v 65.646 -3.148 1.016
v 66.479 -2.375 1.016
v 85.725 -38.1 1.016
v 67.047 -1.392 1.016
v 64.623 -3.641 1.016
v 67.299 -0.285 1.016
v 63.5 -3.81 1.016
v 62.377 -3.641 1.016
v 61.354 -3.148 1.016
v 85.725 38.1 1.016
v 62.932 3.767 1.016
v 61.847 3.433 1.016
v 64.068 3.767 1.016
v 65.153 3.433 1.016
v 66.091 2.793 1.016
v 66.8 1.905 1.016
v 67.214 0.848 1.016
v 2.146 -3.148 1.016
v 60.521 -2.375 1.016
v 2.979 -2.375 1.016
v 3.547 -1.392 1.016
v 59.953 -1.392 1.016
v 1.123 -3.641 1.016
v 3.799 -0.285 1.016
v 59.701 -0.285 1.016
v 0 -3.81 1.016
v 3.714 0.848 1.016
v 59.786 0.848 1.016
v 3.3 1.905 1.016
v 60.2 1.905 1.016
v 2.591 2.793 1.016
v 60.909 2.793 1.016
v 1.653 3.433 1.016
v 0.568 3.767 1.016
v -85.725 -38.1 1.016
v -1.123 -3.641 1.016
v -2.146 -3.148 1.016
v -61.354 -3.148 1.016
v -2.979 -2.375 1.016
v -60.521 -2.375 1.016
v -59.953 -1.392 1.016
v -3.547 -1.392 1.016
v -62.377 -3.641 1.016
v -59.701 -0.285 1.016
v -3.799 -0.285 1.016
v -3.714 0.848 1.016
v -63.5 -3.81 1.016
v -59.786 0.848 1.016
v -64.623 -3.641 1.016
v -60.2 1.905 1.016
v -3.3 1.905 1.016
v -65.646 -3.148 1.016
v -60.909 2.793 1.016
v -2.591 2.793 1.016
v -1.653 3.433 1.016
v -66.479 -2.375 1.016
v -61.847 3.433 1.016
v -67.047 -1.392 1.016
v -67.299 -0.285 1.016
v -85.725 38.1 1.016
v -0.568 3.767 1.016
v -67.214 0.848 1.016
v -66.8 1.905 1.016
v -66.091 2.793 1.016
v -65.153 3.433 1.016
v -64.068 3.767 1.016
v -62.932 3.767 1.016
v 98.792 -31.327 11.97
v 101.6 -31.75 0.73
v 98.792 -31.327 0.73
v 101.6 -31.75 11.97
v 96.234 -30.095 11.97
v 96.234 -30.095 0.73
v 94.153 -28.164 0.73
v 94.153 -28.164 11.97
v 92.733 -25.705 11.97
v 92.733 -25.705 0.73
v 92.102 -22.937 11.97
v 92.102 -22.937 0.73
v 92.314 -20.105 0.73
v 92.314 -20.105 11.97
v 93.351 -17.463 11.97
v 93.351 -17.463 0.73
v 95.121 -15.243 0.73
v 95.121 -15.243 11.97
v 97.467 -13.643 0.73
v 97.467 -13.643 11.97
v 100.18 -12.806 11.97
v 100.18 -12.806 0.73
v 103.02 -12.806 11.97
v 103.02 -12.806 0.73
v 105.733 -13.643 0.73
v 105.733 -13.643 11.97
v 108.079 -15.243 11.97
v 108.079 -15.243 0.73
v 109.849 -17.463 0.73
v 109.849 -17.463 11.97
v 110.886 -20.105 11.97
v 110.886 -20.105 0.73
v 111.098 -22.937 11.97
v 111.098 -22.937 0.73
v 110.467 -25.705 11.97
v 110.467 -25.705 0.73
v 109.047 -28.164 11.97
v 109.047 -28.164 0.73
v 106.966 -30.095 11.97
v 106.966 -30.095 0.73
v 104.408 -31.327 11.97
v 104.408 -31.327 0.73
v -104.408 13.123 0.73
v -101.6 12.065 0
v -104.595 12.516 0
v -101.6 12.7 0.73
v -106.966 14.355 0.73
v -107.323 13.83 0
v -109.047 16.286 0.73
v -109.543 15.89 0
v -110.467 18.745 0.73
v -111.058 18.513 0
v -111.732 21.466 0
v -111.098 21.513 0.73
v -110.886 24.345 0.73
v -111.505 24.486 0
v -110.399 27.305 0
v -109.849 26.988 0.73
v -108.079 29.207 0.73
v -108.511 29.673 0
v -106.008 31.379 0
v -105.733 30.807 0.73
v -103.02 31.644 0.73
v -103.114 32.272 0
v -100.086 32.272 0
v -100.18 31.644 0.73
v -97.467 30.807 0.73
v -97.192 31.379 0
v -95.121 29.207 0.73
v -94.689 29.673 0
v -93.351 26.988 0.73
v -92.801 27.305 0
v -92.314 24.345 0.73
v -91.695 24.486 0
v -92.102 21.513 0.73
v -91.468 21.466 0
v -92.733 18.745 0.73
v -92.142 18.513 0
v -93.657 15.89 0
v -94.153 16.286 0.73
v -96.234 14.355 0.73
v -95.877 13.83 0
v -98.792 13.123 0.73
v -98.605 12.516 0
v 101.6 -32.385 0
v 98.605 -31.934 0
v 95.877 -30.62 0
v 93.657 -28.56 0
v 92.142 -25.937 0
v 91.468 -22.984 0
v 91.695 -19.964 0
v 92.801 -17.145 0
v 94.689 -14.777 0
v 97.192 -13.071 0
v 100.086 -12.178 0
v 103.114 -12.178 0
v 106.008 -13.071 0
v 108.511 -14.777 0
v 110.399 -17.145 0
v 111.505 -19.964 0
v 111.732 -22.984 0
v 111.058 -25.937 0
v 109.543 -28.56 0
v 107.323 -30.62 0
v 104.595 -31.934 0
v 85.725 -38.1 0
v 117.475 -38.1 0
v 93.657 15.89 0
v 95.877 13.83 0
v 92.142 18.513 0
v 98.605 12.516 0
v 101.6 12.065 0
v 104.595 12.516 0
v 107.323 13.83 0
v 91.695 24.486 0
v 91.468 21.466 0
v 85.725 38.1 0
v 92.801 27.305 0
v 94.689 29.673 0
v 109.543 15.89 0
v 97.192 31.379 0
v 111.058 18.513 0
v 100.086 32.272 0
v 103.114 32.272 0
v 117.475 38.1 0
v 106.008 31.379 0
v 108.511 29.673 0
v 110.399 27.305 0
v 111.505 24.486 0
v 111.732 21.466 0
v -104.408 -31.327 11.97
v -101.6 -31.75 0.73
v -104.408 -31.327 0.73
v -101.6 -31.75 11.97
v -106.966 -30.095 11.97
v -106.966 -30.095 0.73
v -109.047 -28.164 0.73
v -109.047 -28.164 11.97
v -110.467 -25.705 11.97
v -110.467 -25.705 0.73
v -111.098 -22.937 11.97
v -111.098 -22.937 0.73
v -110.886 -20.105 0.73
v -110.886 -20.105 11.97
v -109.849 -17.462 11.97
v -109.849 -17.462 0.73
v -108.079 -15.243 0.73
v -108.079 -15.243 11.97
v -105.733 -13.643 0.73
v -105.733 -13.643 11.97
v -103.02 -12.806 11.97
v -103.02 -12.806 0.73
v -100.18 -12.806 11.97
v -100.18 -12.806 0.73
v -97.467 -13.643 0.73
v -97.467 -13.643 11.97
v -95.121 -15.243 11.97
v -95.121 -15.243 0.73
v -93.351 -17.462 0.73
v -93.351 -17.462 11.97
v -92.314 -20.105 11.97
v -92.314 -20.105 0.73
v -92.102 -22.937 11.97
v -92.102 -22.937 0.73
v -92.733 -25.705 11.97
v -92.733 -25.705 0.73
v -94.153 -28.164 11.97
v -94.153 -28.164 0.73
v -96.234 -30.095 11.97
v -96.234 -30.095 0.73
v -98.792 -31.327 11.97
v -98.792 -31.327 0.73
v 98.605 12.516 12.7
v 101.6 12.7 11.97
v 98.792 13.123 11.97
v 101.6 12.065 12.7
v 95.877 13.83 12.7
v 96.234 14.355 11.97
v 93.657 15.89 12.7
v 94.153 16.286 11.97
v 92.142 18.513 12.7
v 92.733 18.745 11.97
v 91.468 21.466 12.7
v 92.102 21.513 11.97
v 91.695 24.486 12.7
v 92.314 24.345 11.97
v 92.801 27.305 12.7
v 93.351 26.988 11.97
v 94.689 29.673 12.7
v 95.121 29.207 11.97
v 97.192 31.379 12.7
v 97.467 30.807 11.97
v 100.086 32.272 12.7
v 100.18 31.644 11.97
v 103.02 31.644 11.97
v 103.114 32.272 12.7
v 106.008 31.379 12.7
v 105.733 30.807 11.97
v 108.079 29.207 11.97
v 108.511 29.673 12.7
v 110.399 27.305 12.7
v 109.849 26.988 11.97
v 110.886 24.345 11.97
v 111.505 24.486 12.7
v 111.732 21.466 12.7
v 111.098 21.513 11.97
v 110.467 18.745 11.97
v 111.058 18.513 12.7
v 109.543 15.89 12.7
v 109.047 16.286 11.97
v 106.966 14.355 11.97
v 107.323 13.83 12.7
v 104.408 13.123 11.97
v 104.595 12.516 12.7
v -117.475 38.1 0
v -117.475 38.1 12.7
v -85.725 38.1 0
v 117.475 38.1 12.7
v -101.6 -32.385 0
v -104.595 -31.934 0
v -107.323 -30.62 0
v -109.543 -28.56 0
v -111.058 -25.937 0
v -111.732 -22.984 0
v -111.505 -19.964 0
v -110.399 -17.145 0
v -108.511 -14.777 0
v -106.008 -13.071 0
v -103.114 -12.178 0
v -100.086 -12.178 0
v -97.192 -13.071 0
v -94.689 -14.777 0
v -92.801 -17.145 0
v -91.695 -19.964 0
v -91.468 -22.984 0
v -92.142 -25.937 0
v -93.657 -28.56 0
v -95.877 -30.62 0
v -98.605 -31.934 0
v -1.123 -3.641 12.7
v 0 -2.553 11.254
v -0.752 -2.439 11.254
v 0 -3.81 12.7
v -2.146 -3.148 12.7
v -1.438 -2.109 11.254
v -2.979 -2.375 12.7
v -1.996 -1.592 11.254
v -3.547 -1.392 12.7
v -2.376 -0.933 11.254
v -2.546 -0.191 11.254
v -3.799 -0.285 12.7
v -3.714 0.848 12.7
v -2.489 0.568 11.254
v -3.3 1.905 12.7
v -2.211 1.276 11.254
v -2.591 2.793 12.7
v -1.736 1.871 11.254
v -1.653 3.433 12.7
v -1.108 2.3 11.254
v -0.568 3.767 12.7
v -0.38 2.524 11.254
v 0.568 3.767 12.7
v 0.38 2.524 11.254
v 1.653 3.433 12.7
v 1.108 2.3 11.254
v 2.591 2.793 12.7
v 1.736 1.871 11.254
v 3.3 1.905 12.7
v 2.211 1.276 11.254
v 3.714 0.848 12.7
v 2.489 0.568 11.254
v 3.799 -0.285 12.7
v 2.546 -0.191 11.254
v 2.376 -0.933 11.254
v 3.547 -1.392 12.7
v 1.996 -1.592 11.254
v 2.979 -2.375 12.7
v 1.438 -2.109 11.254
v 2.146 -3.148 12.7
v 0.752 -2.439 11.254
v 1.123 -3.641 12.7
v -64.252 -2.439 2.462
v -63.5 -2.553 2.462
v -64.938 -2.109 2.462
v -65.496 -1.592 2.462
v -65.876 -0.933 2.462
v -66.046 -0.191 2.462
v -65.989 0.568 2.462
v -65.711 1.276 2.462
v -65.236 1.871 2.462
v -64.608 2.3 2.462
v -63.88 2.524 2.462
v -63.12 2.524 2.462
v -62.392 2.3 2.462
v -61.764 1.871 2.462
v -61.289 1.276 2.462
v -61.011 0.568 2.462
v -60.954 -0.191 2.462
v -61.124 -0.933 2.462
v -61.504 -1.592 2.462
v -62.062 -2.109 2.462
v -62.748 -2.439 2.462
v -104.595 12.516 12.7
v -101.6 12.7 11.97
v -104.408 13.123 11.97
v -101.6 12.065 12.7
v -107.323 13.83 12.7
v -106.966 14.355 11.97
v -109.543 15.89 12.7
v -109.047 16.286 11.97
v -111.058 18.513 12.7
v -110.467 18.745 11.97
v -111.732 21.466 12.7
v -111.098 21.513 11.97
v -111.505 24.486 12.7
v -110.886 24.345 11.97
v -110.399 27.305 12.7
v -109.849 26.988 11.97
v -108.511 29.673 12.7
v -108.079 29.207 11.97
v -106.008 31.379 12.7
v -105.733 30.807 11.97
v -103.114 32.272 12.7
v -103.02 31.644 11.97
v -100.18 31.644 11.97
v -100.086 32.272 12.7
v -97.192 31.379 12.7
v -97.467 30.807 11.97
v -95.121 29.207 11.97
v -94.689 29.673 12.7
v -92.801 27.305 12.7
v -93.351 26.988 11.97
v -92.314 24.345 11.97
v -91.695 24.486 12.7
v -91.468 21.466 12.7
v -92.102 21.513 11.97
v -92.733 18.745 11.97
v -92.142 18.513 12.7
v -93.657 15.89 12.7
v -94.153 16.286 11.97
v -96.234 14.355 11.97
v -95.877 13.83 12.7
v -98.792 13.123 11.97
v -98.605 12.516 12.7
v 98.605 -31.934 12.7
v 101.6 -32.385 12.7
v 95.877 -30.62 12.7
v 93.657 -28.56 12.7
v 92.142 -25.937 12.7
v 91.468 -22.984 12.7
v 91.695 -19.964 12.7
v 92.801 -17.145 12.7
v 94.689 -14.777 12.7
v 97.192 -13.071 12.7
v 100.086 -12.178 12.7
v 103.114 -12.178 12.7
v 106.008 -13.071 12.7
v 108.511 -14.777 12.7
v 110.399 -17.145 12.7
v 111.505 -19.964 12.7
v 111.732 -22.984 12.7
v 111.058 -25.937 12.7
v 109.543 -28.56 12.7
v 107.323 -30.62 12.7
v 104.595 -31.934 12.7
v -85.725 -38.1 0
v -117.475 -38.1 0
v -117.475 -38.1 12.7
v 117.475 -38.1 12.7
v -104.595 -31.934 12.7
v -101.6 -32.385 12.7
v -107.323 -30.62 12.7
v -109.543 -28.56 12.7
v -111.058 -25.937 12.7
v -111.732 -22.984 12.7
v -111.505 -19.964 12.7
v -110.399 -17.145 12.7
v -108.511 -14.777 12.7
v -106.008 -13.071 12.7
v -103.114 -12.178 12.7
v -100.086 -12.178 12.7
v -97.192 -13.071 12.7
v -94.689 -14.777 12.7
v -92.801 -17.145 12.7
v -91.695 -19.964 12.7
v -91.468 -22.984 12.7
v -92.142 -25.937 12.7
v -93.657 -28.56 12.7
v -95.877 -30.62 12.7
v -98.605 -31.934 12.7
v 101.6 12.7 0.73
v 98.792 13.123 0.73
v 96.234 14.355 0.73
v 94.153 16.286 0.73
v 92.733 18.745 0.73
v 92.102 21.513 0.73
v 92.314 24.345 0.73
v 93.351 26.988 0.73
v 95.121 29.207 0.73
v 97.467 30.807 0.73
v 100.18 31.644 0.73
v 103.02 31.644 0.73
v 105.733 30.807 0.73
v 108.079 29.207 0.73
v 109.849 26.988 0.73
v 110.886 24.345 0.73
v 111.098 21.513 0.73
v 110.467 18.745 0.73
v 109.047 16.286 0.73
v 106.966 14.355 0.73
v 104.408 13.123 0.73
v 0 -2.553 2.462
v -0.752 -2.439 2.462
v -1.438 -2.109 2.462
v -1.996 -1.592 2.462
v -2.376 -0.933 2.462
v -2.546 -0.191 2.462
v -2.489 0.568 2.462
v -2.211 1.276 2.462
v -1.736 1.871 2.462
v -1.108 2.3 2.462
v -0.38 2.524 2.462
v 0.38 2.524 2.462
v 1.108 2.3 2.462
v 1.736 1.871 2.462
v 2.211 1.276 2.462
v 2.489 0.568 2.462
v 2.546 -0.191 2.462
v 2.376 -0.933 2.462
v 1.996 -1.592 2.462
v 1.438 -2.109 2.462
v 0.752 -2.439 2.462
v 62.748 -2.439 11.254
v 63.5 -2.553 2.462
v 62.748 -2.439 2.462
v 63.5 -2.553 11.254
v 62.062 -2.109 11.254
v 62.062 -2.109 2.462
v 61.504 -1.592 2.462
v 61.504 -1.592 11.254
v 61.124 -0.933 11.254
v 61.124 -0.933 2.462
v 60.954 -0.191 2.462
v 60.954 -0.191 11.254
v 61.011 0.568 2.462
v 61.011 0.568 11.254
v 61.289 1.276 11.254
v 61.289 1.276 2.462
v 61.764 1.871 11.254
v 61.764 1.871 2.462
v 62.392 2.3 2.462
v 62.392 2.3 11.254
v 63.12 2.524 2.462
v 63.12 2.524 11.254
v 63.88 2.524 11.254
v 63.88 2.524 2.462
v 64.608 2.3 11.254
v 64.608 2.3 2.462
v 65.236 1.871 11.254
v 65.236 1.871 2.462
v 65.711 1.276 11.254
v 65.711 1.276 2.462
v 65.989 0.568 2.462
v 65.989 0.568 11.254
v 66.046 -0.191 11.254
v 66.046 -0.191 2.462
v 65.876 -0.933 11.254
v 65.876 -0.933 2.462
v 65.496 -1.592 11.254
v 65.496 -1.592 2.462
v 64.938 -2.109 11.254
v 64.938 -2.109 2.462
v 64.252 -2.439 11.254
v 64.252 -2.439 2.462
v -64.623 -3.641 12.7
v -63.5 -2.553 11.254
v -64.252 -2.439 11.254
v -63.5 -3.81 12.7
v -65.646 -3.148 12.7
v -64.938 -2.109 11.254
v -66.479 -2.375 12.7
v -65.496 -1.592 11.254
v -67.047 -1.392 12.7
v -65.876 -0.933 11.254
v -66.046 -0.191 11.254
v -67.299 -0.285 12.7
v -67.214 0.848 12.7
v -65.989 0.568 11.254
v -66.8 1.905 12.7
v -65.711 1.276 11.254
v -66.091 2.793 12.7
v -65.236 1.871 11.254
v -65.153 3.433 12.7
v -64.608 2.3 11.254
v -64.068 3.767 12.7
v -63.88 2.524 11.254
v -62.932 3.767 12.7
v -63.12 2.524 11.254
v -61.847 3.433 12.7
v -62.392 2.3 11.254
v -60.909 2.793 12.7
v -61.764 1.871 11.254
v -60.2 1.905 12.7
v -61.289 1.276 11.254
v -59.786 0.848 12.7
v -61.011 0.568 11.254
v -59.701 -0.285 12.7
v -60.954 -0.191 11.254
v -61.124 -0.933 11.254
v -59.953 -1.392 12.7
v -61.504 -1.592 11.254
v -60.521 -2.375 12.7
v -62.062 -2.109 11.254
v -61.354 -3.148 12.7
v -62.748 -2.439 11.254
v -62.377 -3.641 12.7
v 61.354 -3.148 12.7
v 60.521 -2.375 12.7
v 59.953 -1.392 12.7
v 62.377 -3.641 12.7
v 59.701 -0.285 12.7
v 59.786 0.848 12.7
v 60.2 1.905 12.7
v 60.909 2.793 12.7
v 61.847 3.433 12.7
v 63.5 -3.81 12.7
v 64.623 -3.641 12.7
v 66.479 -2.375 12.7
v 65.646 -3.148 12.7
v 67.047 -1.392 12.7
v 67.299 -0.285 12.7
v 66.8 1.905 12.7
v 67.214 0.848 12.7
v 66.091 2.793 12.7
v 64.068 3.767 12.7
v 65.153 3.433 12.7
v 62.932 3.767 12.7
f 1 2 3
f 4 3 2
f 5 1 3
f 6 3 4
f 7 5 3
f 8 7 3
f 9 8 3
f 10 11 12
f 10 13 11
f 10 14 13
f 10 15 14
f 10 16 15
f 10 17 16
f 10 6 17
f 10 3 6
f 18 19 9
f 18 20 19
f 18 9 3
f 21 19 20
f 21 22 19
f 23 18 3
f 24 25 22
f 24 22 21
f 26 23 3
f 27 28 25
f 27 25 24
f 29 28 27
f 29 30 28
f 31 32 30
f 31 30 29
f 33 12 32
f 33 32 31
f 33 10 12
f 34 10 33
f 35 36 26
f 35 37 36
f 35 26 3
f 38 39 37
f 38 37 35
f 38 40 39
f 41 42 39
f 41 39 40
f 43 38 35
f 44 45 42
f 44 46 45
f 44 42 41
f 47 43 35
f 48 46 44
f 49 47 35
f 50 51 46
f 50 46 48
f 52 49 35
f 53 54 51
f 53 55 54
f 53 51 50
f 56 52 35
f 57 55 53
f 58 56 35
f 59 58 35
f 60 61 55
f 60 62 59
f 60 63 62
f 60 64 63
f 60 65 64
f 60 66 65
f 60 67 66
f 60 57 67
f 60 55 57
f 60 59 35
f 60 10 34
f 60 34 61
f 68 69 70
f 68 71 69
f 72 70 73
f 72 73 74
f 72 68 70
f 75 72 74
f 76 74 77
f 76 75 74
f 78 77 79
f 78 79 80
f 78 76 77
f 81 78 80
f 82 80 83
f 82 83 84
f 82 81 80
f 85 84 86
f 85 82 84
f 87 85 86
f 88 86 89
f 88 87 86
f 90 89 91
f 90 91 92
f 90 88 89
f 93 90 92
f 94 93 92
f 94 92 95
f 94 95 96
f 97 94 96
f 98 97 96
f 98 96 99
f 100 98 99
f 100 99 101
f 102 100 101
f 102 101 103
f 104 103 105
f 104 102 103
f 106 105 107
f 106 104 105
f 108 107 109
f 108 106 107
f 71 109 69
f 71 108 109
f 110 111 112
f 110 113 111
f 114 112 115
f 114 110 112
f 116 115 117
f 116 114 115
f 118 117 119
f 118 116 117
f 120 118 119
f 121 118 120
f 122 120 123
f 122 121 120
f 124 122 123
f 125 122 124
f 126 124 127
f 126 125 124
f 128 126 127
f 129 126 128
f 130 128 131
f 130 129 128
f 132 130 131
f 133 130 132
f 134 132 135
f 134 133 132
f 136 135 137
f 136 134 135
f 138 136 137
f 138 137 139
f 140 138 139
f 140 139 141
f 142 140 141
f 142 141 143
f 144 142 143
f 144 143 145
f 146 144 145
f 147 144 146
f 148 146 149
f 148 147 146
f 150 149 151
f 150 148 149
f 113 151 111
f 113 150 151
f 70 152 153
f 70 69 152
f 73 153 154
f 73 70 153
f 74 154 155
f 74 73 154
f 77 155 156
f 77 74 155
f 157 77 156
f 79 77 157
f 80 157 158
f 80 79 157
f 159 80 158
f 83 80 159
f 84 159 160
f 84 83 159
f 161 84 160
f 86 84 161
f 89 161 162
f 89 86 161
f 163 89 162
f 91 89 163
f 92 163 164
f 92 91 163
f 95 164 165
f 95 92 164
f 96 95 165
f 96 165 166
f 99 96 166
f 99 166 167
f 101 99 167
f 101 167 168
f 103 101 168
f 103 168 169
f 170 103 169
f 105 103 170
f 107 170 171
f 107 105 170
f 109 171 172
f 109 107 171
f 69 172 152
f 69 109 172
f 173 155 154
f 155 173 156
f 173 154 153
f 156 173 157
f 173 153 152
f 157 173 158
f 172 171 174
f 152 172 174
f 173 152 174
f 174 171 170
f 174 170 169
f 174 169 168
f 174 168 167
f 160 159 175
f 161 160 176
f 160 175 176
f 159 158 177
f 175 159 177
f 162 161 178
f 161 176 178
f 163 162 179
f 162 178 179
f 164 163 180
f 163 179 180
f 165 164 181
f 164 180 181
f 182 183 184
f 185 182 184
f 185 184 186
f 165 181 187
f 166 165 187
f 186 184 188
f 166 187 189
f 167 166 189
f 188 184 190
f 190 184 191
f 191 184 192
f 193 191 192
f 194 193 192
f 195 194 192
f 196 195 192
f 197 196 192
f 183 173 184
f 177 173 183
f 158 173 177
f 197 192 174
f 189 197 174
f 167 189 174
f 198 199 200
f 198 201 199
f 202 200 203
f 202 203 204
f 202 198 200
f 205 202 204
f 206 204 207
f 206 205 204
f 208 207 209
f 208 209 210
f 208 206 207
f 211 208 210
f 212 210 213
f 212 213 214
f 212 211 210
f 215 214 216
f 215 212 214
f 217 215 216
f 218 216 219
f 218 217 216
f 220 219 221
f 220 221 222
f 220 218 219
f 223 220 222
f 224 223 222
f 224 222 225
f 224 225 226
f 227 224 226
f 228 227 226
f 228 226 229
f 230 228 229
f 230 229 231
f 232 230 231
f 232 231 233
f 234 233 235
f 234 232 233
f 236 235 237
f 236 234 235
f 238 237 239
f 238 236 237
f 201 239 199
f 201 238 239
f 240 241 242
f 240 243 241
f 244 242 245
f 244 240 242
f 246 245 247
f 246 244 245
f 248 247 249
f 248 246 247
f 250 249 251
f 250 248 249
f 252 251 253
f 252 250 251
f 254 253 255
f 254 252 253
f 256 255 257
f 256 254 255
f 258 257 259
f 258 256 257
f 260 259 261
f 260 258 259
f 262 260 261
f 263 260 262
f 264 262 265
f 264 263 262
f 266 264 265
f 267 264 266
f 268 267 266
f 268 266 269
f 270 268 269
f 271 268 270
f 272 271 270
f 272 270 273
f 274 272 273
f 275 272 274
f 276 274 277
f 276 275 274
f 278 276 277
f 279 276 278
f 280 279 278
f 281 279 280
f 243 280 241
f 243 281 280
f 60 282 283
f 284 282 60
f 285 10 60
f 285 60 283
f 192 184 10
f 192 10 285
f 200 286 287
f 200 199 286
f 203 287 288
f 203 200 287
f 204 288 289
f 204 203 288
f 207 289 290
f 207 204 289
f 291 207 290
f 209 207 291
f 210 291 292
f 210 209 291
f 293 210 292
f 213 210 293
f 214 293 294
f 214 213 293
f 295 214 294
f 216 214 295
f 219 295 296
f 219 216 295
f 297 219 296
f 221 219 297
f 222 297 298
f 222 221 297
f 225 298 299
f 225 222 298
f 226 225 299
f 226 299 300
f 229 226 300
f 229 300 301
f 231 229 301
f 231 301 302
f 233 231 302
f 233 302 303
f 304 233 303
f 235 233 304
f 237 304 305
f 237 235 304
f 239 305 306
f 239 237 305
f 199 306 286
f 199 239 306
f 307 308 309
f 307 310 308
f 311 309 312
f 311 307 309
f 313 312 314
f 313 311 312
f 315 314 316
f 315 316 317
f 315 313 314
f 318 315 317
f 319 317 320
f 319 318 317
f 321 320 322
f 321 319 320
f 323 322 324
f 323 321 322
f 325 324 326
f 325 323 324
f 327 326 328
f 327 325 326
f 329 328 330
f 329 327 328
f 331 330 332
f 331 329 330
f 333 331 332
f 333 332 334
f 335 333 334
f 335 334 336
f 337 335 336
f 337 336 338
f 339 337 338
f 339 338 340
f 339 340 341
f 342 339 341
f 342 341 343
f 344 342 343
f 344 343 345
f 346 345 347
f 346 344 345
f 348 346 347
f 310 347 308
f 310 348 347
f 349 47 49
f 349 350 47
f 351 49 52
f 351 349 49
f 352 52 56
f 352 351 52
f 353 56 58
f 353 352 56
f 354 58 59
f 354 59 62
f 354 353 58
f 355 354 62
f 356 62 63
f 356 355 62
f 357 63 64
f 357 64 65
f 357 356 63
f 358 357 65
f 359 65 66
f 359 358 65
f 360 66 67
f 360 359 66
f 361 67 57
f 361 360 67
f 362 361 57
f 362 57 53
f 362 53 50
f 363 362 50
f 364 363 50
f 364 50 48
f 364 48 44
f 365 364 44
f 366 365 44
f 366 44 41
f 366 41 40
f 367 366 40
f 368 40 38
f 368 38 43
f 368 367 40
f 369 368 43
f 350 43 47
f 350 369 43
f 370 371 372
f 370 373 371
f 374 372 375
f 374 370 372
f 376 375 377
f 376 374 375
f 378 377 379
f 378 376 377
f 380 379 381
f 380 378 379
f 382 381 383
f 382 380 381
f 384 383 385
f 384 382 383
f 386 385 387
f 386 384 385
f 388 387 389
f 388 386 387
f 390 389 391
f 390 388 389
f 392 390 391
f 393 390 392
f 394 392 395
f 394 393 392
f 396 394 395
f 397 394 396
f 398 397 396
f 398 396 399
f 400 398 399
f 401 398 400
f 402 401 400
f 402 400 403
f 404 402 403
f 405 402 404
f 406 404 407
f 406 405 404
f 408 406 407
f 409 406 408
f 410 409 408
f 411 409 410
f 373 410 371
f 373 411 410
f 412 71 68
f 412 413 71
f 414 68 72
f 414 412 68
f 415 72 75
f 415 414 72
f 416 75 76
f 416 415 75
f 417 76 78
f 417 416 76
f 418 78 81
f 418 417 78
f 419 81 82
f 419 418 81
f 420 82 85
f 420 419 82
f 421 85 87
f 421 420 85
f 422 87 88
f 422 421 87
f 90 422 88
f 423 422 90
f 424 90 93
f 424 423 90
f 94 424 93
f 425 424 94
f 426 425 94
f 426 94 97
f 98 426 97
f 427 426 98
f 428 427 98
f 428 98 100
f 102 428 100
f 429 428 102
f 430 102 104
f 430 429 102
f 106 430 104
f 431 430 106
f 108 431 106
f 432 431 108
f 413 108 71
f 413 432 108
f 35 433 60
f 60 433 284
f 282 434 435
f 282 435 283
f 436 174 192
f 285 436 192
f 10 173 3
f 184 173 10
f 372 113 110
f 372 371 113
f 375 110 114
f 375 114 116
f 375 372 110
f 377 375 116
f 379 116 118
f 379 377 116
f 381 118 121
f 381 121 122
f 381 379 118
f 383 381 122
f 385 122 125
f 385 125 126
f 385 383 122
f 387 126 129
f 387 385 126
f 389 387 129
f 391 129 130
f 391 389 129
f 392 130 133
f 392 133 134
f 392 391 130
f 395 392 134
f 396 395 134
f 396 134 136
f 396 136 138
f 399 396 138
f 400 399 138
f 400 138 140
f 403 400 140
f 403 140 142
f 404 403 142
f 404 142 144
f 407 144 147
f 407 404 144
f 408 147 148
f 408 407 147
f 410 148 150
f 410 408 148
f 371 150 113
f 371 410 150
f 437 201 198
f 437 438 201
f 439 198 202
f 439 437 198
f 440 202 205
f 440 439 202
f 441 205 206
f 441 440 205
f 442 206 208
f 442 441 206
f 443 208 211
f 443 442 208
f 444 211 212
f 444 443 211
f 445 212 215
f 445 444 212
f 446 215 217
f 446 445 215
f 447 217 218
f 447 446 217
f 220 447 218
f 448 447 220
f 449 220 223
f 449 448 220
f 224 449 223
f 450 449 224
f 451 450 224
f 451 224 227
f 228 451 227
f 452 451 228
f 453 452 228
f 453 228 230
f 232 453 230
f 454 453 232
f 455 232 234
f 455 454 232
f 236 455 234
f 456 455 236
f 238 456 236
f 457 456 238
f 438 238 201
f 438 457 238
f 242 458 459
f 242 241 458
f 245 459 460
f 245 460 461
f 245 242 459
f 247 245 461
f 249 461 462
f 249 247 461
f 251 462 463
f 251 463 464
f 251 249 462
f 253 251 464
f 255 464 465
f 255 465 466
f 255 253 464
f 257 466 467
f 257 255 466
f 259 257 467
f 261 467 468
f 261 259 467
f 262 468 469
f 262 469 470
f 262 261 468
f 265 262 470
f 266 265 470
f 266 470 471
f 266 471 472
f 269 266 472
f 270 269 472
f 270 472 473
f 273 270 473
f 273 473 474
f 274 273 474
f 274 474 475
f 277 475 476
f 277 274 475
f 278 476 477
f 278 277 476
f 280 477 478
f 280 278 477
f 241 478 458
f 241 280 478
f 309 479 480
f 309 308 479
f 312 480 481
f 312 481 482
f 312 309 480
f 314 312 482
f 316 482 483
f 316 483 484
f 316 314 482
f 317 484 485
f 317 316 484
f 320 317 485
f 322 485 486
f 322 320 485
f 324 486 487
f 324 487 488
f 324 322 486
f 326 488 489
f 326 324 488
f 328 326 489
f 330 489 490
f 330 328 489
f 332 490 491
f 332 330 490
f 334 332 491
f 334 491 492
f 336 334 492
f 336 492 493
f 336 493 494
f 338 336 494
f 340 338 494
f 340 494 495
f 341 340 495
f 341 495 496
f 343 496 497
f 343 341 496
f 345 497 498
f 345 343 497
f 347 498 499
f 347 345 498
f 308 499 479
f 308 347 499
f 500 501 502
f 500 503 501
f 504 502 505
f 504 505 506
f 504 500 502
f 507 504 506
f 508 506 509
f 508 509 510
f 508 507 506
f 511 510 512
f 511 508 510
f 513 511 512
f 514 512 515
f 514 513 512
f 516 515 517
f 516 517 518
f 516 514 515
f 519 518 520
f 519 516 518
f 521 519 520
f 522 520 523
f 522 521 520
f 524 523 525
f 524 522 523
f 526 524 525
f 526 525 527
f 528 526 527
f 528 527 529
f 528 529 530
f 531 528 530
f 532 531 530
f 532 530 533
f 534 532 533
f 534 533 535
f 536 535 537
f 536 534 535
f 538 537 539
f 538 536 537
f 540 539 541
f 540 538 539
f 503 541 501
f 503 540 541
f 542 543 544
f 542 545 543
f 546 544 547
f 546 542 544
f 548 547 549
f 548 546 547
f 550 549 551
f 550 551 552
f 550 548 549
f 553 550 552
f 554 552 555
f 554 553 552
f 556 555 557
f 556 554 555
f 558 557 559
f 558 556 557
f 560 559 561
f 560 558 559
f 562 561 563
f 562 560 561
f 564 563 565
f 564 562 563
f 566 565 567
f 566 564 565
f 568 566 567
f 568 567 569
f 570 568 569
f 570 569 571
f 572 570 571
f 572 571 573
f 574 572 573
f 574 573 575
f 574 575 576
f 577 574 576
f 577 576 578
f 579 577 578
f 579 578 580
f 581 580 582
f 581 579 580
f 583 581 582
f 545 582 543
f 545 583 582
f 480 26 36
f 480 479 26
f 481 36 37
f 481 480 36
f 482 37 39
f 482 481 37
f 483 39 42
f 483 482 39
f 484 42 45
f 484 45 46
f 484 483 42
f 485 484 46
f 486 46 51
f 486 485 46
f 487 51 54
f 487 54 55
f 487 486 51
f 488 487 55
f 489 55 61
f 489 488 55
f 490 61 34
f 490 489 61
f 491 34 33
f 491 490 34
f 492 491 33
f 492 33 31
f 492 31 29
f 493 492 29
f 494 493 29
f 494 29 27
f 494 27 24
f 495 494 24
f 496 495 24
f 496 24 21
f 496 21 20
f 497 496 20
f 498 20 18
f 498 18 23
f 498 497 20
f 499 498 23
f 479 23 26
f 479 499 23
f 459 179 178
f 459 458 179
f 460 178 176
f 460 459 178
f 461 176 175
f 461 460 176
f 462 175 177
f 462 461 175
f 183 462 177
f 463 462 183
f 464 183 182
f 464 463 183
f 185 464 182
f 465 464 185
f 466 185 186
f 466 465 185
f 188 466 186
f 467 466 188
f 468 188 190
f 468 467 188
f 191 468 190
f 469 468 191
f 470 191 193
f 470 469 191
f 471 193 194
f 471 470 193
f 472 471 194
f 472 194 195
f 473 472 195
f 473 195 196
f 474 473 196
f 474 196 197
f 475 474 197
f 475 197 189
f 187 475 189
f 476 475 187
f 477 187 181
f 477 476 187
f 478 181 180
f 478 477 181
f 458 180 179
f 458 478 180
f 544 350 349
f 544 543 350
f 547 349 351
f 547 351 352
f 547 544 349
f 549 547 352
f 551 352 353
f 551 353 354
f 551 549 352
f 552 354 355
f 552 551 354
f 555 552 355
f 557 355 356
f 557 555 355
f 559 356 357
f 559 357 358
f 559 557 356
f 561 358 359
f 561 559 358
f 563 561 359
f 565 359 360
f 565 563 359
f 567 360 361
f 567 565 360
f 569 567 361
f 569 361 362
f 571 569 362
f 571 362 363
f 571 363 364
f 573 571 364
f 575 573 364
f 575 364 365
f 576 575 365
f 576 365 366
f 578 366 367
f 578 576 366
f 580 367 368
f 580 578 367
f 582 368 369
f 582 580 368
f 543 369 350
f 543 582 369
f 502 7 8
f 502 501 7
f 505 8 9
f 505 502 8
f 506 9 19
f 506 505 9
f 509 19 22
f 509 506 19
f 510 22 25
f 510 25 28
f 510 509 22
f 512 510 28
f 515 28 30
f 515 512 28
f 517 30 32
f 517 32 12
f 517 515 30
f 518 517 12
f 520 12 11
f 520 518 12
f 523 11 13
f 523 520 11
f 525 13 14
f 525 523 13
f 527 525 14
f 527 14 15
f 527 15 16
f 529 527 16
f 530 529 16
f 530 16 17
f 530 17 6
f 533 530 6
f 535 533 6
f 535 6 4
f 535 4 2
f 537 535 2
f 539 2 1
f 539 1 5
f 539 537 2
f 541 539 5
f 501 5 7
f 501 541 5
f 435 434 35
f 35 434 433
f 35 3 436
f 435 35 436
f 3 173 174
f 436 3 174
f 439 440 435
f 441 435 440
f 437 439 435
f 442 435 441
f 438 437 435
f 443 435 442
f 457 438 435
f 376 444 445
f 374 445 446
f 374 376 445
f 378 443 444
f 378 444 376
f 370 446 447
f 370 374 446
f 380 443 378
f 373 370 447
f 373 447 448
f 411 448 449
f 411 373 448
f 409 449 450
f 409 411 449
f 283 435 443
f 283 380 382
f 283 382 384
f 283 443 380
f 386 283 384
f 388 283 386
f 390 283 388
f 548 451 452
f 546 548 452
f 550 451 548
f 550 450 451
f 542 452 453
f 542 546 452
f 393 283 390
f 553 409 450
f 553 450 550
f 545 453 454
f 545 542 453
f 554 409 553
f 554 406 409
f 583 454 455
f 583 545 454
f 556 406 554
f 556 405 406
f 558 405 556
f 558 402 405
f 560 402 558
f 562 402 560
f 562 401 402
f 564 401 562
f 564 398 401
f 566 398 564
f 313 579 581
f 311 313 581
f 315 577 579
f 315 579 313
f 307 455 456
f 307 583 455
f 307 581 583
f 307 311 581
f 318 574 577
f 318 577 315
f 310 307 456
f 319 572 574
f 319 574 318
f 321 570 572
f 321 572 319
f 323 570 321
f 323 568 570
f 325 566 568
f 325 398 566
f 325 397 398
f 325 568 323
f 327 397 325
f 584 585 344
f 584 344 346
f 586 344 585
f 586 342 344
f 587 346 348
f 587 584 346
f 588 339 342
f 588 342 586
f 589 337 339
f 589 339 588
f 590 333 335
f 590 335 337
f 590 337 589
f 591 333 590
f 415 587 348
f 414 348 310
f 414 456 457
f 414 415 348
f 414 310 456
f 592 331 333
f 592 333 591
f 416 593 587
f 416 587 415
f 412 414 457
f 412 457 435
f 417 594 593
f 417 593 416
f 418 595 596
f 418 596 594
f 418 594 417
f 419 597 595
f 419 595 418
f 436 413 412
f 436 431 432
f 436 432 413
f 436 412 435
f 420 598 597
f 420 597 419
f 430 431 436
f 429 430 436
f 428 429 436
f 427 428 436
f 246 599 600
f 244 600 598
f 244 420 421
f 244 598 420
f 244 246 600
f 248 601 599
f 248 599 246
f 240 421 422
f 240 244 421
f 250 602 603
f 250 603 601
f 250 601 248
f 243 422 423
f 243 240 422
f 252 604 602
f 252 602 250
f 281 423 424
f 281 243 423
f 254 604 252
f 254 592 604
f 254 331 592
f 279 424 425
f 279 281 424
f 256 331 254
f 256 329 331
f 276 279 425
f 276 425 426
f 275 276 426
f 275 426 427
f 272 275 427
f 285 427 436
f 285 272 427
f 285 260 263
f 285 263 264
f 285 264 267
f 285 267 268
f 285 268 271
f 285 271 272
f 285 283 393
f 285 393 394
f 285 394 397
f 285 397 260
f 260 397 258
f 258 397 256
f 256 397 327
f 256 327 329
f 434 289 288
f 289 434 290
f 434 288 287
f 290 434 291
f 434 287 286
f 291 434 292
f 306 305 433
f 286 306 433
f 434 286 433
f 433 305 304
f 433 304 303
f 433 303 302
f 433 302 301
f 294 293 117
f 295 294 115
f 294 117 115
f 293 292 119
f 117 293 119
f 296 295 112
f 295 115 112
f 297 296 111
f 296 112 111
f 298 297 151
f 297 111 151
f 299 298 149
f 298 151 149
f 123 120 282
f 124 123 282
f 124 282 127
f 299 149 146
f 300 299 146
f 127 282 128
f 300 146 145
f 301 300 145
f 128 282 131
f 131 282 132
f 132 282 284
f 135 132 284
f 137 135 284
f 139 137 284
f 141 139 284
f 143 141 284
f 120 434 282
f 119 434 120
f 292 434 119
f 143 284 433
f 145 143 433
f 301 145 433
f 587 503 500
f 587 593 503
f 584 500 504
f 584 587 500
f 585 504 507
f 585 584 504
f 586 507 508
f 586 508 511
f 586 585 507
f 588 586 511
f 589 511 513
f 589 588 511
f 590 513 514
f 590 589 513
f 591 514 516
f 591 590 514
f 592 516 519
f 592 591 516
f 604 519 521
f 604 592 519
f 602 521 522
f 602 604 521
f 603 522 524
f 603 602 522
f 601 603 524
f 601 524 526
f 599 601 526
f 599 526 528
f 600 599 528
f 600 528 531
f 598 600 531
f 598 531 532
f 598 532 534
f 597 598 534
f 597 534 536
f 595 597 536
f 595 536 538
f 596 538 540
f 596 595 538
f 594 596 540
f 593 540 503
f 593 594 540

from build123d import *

# Parameters (mm, degrees)
SKETCH1_W                        = 234.95
SKETCH1_H                        = 76.2
EXTRUDE1_DEPTH                   = 12.7
F_1_2_CLEARANCE_HOLE1_AT_2_COUNT = 2
F_1_2_CLEARANCE_HOLE1_AT_2_PITCH = 44.45
F_1_2_CLEARANCE_HOLE1_AT_3_COUNT = 2
F_1_2_CLEARANCE_HOLE1_AT_3_PITCH = 203.2
F_1_2_CLEARANCE_HOLE1_AT_4_COUNT = 2
F_1_2_CLEARANCE_HOLE1_AT_4_PITCH = 208.004909798
SKETCH6_W                        = 171.45
SKETCH6_H                        = 76.2
CUT_EXTRUDE1_DEPTH               = 1.016
F_1_4_20_TAPPED_HOLE1_AT_2_COUNT = 2
F_1_4_20_TAPPED_HOLE1_AT_2_PITCH = 63.5
F_1_4_20_TAPPED_HOLE1_AT_3_COUNT = 2
F_1_4_20_TAPPED_HOLE1_AT_3_PITCH = 127


with BuildPart() as part:
    # Sketch1 → Extrude1 (new body)
    with BuildSketch(Plane.XY):
        Rectangle(SKETCH1_W, SKETCH1_H)
    extrude(amount=EXTRUDE1_DEPTH)

    # Sketch2 → 1/2 Clearance Hole1 (revolve, cut)
    with BuildSketch(Plane(origin=(-101.6, 22.225, 12.7), x_dir=(0, -1, 0), z_dir=(1, 0, 0))):
        Polygon((0, 0), (0, 12.7), (10.16, 12.7), (9.525, 11.969516061), (9.525, 0.730483939), (10.16, 0), align=None)
    f_1_2_clearance_hole1 = revolve(axis=Axis((-101.6, 22.225, 19.05), (0, 0, -1)), mode=Mode.SUBTRACT)

    # 1/2 Clearance Hole1 at 2: 1/2 Clearance Hole1 ×2
    with Locations(*[(0, -i * F_1_2_CLEARANCE_HOLE1_AT_2_PITCH, 0) for i in range(1, F_1_2_CLEARANCE_HOLE1_AT_2_COUNT)]):
        add(f_1_2_clearance_hole1, mode=Mode.SUBTRACT)

    # 1/2 Clearance Hole1 at 3: 1/2 Clearance Hole1 ×2
    with Locations(*[(i * F_1_2_CLEARANCE_HOLE1_AT_3_PITCH, 0, 0) for i in range(1, F_1_2_CLEARANCE_HOLE1_AT_3_COUNT)]):
        add(f_1_2_clearance_hole1, mode=Mode.SUBTRACT)

    # 1/2 Clearance Hole1 at 4: 1/2 Clearance Hole1 ×2
    with Locations(*[Vector(0.976900017, -0.213696879, 0) * (i * F_1_2_CLEARANCE_HOLE1_AT_4_PITCH) for i in range(1, F_1_2_CLEARANCE_HOLE1_AT_4_COUNT)]):
        add(f_1_2_clearance_hole1, mode=Mode.SUBTRACT)

    # Sketch6 → Cut-Extrude1 (cut)
    with BuildSketch(Plane(origin=(0, 0, 0), x_dir=(-1, 0, 0), z_dir=(0, 0, -1))):
        Rectangle(SKETCH6_W, SKETCH6_H)
    extrude(amount=-CUT_EXTRUDE1_DEPTH, mode=Mode.SUBTRACT)

    # Sketch4 → 1/4-20 Tapped Hole1 (revolve, cut)
    with BuildSketch(Plane(origin=(-63.5, 0, 12.7), x_dir=(0, -1, 0), z_dir=(1, 0, 0))):
        Polygon((0, 0), (0, 11.684), (3.81, 11.684), (2.5527, 10.237641802), (2.5527, 1.446358198), (3.81, 0), align=None)
    f_1_4_20_tapped_hole1 = revolve(axis=Axis((-63.5, 0, 19.05), (0, 0, -1)), mode=Mode.SUBTRACT)

    # 1/4-20 Tapped Hole1 at 2: 1/4-20 Tapped Hole1 ×2
    with Locations(*[(i * F_1_4_20_TAPPED_HOLE1_AT_2_PITCH, 0, 0) for i in range(1, F_1_4_20_TAPPED_HOLE1_AT_2_COUNT)]):
        add(f_1_4_20_tapped_hole1, mode=Mode.SUBTRACT)

    # 1/4-20 Tapped Hole1 at 3: 1/4-20 Tapped Hole1 ×2
    with Locations(*[(i * F_1_4_20_TAPPED_HOLE1_AT_3_PITCH, 0, 0) for i in range(1, F_1_4_20_TAPPED_HOLE1_AT_3_COUNT)]):
        add(f_1_4_20_tapped_hole1, mode=Mode.SUBTRACT)


solid = part.part
